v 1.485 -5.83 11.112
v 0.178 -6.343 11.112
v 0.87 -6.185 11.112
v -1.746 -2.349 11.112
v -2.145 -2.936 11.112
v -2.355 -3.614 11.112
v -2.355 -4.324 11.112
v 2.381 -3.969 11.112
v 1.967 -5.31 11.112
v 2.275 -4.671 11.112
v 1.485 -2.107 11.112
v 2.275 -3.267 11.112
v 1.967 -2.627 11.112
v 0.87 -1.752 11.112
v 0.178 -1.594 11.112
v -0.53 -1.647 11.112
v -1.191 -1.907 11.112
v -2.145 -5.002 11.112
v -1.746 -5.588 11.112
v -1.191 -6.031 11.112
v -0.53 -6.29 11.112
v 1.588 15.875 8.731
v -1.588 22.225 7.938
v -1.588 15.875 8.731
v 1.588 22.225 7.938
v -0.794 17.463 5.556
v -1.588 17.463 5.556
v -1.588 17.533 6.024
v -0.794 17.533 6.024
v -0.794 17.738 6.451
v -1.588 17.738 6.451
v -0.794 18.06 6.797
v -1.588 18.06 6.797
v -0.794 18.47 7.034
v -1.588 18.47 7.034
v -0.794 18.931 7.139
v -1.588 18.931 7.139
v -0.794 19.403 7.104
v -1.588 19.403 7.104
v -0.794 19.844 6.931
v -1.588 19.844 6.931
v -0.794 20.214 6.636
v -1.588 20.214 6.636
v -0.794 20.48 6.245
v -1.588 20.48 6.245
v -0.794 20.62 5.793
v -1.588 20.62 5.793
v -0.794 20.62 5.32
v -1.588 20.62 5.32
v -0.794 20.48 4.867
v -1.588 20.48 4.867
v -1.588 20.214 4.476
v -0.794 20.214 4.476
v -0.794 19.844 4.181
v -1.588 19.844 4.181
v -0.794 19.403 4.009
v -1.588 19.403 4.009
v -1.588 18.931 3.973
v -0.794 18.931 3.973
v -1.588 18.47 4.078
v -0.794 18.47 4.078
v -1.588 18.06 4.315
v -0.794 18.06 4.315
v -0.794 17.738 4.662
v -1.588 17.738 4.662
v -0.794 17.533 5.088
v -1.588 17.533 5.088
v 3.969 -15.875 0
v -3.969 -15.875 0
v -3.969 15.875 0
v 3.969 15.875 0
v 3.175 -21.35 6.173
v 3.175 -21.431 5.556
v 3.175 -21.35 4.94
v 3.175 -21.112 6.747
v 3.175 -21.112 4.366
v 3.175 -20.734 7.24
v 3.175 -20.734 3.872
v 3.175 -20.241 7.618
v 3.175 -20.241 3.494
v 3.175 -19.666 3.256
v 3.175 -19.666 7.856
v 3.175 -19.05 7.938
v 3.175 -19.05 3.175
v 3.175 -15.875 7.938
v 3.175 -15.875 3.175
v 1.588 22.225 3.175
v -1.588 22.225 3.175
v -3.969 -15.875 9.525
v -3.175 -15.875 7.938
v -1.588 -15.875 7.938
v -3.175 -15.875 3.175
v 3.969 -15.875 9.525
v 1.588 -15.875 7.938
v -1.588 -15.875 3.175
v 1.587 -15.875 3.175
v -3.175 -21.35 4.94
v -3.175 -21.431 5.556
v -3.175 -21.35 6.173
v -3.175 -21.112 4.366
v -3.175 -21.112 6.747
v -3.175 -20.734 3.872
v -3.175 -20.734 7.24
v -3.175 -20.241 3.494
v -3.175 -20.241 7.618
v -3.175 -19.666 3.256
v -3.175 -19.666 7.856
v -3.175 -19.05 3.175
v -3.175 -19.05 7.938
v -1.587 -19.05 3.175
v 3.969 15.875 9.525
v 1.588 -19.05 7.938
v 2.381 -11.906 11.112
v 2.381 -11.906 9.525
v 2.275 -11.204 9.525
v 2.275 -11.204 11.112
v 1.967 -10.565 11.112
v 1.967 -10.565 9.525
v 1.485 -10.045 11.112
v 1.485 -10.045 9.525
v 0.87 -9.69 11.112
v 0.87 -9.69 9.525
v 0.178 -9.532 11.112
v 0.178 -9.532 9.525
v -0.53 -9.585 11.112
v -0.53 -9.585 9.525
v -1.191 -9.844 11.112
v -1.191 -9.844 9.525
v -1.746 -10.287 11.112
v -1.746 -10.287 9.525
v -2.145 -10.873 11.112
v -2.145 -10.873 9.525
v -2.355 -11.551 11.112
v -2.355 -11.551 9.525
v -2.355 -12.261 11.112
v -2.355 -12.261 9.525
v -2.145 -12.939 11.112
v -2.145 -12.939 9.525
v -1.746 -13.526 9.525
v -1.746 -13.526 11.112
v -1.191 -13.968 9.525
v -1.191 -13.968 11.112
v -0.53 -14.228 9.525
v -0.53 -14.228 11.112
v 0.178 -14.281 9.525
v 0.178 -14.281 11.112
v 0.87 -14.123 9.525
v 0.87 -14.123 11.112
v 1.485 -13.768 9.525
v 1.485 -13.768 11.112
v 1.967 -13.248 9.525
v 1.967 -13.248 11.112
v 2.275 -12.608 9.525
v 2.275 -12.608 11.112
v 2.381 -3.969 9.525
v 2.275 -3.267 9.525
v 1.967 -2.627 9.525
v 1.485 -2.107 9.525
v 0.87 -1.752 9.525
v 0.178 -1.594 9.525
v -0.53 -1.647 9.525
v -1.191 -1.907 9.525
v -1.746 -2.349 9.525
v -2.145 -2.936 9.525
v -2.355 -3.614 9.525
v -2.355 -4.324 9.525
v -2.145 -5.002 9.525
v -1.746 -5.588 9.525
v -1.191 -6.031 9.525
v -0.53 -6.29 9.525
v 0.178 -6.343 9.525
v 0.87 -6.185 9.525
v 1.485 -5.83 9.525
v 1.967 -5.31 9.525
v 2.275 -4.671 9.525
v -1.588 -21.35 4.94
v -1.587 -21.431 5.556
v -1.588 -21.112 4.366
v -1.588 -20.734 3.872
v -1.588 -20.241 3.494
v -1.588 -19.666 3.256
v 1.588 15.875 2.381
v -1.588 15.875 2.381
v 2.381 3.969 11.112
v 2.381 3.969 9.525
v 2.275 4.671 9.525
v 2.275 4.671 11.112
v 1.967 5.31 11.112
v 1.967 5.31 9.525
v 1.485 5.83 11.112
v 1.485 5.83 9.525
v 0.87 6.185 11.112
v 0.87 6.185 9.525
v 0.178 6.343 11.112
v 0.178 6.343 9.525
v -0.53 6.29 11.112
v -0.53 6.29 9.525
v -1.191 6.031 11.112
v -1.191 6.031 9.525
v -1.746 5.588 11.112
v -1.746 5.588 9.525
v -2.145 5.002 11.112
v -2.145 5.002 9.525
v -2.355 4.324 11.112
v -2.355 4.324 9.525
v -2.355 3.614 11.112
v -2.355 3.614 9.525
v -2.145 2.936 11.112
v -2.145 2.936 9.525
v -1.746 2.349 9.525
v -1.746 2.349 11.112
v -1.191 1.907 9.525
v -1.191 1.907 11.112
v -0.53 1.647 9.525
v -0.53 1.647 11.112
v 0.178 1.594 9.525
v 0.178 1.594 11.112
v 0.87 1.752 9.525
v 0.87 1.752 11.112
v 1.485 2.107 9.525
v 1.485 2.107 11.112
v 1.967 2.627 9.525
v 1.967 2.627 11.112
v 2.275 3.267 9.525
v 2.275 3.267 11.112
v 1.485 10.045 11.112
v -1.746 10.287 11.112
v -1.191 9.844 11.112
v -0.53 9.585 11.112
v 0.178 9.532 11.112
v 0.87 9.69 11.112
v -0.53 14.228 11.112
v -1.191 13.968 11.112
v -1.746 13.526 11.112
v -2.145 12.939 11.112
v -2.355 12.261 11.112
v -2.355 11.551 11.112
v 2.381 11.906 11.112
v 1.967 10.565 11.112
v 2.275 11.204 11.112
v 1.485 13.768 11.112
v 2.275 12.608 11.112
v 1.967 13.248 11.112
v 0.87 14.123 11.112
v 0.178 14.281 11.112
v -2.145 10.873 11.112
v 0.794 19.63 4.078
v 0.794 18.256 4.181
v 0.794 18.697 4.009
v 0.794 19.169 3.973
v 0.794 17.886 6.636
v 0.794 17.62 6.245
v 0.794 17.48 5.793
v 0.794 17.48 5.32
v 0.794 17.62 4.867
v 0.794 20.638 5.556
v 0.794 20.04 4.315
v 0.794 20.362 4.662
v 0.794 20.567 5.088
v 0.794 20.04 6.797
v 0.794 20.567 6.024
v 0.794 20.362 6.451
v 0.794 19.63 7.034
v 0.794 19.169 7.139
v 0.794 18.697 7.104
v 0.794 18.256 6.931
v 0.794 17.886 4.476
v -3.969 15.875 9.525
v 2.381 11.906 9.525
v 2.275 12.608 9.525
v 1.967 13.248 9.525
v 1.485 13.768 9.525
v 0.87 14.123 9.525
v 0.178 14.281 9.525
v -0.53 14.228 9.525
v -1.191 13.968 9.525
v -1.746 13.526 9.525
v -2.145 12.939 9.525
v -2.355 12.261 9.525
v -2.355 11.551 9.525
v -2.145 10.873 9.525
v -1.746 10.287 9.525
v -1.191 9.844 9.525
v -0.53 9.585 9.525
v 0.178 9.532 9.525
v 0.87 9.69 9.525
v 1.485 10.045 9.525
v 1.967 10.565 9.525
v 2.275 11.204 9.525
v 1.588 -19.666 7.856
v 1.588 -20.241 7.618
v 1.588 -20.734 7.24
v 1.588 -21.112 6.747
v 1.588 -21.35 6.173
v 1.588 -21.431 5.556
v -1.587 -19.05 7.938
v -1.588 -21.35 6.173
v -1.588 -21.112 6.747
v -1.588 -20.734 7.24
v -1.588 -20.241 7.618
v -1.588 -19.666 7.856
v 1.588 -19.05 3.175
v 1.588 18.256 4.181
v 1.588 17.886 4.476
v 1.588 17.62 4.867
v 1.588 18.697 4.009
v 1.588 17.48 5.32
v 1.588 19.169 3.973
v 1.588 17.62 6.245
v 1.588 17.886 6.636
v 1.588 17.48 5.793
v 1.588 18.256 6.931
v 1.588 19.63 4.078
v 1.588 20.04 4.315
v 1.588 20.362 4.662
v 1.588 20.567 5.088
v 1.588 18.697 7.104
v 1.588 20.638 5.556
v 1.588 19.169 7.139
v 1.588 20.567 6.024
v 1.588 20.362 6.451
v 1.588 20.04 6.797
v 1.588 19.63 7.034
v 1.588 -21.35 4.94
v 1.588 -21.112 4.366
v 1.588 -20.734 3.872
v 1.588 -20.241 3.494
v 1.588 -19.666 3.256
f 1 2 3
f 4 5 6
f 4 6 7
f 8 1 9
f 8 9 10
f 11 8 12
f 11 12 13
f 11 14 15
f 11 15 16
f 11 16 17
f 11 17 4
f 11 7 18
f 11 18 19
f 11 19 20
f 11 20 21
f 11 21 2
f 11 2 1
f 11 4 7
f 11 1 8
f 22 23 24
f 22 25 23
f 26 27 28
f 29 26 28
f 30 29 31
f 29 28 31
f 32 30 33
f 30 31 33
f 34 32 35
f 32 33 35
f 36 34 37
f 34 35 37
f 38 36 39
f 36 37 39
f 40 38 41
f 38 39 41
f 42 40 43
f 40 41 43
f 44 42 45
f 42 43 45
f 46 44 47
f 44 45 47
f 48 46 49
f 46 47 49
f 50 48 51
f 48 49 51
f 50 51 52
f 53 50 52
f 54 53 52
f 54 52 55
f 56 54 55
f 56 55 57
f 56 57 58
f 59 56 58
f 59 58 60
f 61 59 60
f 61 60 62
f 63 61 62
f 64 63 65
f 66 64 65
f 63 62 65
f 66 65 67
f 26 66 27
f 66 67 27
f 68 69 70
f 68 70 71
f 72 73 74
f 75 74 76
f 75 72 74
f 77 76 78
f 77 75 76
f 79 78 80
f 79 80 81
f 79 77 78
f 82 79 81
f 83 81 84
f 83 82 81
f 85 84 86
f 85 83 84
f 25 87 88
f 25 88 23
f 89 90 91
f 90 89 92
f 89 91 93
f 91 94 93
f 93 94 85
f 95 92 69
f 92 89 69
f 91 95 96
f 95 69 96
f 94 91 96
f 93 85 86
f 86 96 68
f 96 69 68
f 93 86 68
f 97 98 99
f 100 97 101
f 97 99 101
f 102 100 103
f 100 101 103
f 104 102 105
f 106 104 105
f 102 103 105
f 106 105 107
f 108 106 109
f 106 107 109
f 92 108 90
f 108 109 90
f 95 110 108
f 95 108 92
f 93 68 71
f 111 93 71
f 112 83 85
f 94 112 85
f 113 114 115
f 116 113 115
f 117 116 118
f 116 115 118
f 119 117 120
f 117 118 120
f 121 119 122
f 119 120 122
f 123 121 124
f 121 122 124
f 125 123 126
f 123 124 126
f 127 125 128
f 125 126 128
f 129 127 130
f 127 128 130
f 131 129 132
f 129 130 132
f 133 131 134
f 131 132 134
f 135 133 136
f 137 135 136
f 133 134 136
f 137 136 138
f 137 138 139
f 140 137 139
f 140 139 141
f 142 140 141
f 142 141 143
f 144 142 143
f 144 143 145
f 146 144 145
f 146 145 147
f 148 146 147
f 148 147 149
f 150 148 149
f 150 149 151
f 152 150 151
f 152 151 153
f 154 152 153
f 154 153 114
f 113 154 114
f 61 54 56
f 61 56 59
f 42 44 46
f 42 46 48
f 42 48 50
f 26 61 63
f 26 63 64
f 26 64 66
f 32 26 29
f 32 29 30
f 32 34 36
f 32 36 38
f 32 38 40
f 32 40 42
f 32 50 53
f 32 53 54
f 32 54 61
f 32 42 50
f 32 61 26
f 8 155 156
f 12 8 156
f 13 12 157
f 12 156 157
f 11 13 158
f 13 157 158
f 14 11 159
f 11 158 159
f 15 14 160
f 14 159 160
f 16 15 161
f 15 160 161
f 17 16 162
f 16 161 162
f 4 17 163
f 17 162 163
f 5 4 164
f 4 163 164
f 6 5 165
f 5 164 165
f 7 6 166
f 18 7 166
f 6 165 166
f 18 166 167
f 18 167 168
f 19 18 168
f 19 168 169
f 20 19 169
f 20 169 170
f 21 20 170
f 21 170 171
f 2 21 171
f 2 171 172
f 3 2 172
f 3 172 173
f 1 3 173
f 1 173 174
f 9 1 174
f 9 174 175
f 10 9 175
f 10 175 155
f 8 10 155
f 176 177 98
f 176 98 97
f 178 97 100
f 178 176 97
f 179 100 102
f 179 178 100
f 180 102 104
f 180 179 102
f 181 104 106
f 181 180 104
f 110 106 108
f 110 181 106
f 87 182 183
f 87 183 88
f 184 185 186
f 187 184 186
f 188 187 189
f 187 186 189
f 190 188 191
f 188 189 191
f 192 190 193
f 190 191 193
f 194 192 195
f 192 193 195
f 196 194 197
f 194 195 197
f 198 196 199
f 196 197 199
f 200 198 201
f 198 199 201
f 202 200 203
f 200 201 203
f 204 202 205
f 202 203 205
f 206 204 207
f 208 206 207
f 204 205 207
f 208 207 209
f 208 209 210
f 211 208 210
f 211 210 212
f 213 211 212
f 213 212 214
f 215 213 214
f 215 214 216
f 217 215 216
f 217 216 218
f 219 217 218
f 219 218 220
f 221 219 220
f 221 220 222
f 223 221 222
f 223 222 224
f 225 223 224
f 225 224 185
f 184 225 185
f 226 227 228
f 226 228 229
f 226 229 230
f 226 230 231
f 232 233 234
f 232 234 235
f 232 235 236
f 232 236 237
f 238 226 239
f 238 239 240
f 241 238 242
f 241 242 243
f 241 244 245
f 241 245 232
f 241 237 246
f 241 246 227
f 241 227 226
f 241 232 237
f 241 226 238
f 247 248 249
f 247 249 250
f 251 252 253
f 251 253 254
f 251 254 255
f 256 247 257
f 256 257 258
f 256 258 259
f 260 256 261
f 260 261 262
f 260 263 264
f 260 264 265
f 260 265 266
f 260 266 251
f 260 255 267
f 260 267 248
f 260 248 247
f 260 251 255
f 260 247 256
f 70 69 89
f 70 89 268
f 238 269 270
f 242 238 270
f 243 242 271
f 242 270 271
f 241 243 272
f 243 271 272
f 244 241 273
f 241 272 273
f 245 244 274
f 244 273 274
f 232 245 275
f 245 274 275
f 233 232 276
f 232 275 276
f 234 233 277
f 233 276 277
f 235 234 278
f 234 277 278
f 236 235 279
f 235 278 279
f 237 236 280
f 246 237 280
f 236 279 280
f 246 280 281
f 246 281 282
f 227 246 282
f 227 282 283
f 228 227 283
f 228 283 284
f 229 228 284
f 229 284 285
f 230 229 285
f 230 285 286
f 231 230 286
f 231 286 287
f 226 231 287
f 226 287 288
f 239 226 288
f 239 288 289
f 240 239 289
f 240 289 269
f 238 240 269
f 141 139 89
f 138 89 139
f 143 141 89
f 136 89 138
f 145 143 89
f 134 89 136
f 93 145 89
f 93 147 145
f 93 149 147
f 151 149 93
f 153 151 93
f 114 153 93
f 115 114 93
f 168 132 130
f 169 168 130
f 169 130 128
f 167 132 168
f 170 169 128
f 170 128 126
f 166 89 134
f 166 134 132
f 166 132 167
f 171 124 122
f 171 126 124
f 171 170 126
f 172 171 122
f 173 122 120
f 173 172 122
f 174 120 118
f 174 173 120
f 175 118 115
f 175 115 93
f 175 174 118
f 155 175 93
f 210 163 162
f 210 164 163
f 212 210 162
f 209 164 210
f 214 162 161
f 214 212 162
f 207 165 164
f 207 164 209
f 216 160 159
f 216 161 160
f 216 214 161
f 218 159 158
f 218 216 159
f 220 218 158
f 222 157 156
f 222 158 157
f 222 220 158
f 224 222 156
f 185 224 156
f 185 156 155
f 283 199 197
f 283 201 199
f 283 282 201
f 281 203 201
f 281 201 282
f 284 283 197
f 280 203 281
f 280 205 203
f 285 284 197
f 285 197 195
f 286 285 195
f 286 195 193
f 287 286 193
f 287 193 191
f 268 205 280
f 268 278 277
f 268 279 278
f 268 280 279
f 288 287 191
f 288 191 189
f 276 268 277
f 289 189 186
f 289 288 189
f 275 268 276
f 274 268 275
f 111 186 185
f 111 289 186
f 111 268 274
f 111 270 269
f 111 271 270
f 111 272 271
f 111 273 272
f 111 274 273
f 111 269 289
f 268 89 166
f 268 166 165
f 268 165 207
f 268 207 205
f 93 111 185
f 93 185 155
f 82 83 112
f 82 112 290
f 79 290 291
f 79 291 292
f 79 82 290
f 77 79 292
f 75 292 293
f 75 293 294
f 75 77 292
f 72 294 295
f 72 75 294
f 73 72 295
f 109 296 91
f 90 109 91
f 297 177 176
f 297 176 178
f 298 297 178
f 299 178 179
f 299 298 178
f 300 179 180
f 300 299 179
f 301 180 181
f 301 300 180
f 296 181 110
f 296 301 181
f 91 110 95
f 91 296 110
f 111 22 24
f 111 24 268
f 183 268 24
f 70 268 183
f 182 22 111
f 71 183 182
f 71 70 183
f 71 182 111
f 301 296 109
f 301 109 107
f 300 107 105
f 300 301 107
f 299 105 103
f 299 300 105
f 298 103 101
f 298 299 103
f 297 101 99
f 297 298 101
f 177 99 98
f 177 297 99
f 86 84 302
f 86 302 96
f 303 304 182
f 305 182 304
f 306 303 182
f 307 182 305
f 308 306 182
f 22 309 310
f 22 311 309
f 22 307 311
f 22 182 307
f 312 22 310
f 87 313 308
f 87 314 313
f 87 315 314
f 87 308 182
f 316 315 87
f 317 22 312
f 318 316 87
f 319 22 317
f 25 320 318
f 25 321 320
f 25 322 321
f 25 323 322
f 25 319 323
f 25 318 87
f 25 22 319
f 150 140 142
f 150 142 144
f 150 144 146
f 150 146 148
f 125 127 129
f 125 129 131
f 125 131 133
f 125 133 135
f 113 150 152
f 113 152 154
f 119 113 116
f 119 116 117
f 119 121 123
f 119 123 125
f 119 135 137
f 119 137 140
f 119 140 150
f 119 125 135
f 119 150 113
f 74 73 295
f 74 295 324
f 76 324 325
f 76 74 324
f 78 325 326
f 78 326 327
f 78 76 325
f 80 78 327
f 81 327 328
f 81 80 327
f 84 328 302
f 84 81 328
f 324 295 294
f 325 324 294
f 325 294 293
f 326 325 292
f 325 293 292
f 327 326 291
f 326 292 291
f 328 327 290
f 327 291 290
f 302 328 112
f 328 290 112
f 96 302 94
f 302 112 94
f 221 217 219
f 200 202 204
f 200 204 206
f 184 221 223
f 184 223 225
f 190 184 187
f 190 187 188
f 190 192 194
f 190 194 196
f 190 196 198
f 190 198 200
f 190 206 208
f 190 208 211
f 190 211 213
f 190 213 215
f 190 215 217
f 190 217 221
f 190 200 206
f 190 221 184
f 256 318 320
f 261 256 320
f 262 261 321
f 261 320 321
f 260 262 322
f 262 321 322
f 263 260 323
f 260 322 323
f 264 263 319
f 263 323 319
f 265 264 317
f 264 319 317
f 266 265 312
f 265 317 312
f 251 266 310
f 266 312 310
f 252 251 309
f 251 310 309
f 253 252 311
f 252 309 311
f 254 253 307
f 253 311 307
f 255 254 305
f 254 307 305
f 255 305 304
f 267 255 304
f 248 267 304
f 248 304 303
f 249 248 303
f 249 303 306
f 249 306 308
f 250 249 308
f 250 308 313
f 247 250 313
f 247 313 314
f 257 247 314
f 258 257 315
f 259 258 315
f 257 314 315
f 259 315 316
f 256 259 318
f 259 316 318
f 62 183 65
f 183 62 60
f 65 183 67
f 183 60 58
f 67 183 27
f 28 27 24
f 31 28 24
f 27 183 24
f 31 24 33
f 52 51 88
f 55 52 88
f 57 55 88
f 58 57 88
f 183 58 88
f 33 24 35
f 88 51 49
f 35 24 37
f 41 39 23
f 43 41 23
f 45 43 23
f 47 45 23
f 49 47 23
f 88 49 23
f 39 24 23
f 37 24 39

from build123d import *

# Parameters (mm, degrees)
F0_W      = 7.9375
F0_H      = 31.75
F0_R      = 2.38125
F1_DEPTH  = 9.525
F2_DEPTH  = 11.1125
F3_W      = 3.175
F3_H      = 2.38125
F4_DEPTH  = 3.175
F5_W      = 1.5875
F5_H      = 6.35
F6_DEPTH  = 6.35
F7_DEPTH  = 1.5875
F8_R      = 1.5875
F9_DEPTH  = 0.79375
F10_R     = 1.5875
F11_DEPTH = 0.79375


with BuildPart() as f1:
    # F0 (on Top) → F1 (new body)
    with BuildSketch(Plane.XY):
        Rectangle(F0_W, F0_H)
        with Locations((0, -11.90625)):
            Circle(F0_R, mode=Mode.SUBTRACT)
        with Locations((0, -3.96875)):
            Circle(F0_R, mode=Mode.SUBTRACT)
        with Locations((0, 3.96875)):
            Circle(F0_R, mode=Mode.SUBTRACT)
        with Locations((0, 11.90625)):
            Circle(F0_R, mode=Mode.SUBTRACT)
    extrude(amount=F1_DEPTH)

    # F0 (on Top) → F2 (join)
    with BuildSketch(Plane.XY):
        with Locations((0, 11.90625)):
            Circle(F0_R)
        with Locations((0, -11.90625)):
            Circle(F0_R)
        with Locations((0, 3.96875)):
            Circle(F0_R)
        with Locations((0, -3.96875)):
            Circle(F0_R)
    extrude(amount=F2_DEPTH)

    # F3 (on Right) → F4 (join, symmetric)
    with BuildSketch(Plane.YZ):
        with Locations((-17.4625, 6.746875)):
            Rectangle(F3_W, F3_H)
        with Locations((-17.4625, 4.365625)):
            Rectangle(F3_W, F3_H)
        with BuildLine():
            Line((-21.43125, 5.55625), (-19.05, 5.55625))
            Line((-19.05, 5.55625), (-19.05, 7.9375))
            ThreePointArc((-19.05, 7.9375), (-20.733798, 7.240048), (-21.43125, 5.55625))
        make_face()
        with BuildLine():
            Line((-19.05, 3.175), (-19.05, 5.55625))
            Line((-19.05, 5.55625), (-21.43125, 5.55625))
            ThreePointArc((-21.43125, 5.55625), (-20.733798, 3.872452), (-19.05, 3.175))
        make_face()
    extrude(amount=F4_DEPTH, both=True)

    # F5 (on face) → F6 (cut)
    with BuildSketch(Plane.XY.offset(7.9375)):
        with Locations((0.79375, -19.05)):
            Rectangle(F5_W, F5_H)
        with Locations((-0.79375, -19.05)):
            Rectangle(F5_W, F5_H)
    extrude(amount=-F6_DEPTH, mode=Mode.SUBTRACT)

    # F3 (on Right) → F7 (join, symmetric)
    with BuildSketch(Plane.YZ):
        Polygon((15.875, 8.73125), (15.875, 5.55625), (22.225, 5.55625), (22.225, 7.9375), align=None)
        Polygon((22.225, 5.55625), (15.875, 5.55625), (15.875, 2.38125), (22.225, 3.175), align=None)
    extrude(amount=F7_DEPTH, both=True)

    # F8 (on face) → F9 (cut)
    with BuildSketch(Plane.YZ.offset(1.5875)):
        with Locations((19.05, 5.55625)):
            Circle(F8_R)
    extrude(amount=-F9_DEPTH, mode=Mode.SUBTRACT)

    # F10 (on face) → F11 (cut)
    with BuildSketch(Plane(origin=(-1.5875, 0, 0), x_dir=(0, -1, 0), z_dir=(-1, 0, 0))):
        with Locations((-19.05, 5.55625)):
            Circle(F10_R)
    extrude(amount=-F11_DEPTH, mode=Mode.SUBTRACT)


solid = f1.part
